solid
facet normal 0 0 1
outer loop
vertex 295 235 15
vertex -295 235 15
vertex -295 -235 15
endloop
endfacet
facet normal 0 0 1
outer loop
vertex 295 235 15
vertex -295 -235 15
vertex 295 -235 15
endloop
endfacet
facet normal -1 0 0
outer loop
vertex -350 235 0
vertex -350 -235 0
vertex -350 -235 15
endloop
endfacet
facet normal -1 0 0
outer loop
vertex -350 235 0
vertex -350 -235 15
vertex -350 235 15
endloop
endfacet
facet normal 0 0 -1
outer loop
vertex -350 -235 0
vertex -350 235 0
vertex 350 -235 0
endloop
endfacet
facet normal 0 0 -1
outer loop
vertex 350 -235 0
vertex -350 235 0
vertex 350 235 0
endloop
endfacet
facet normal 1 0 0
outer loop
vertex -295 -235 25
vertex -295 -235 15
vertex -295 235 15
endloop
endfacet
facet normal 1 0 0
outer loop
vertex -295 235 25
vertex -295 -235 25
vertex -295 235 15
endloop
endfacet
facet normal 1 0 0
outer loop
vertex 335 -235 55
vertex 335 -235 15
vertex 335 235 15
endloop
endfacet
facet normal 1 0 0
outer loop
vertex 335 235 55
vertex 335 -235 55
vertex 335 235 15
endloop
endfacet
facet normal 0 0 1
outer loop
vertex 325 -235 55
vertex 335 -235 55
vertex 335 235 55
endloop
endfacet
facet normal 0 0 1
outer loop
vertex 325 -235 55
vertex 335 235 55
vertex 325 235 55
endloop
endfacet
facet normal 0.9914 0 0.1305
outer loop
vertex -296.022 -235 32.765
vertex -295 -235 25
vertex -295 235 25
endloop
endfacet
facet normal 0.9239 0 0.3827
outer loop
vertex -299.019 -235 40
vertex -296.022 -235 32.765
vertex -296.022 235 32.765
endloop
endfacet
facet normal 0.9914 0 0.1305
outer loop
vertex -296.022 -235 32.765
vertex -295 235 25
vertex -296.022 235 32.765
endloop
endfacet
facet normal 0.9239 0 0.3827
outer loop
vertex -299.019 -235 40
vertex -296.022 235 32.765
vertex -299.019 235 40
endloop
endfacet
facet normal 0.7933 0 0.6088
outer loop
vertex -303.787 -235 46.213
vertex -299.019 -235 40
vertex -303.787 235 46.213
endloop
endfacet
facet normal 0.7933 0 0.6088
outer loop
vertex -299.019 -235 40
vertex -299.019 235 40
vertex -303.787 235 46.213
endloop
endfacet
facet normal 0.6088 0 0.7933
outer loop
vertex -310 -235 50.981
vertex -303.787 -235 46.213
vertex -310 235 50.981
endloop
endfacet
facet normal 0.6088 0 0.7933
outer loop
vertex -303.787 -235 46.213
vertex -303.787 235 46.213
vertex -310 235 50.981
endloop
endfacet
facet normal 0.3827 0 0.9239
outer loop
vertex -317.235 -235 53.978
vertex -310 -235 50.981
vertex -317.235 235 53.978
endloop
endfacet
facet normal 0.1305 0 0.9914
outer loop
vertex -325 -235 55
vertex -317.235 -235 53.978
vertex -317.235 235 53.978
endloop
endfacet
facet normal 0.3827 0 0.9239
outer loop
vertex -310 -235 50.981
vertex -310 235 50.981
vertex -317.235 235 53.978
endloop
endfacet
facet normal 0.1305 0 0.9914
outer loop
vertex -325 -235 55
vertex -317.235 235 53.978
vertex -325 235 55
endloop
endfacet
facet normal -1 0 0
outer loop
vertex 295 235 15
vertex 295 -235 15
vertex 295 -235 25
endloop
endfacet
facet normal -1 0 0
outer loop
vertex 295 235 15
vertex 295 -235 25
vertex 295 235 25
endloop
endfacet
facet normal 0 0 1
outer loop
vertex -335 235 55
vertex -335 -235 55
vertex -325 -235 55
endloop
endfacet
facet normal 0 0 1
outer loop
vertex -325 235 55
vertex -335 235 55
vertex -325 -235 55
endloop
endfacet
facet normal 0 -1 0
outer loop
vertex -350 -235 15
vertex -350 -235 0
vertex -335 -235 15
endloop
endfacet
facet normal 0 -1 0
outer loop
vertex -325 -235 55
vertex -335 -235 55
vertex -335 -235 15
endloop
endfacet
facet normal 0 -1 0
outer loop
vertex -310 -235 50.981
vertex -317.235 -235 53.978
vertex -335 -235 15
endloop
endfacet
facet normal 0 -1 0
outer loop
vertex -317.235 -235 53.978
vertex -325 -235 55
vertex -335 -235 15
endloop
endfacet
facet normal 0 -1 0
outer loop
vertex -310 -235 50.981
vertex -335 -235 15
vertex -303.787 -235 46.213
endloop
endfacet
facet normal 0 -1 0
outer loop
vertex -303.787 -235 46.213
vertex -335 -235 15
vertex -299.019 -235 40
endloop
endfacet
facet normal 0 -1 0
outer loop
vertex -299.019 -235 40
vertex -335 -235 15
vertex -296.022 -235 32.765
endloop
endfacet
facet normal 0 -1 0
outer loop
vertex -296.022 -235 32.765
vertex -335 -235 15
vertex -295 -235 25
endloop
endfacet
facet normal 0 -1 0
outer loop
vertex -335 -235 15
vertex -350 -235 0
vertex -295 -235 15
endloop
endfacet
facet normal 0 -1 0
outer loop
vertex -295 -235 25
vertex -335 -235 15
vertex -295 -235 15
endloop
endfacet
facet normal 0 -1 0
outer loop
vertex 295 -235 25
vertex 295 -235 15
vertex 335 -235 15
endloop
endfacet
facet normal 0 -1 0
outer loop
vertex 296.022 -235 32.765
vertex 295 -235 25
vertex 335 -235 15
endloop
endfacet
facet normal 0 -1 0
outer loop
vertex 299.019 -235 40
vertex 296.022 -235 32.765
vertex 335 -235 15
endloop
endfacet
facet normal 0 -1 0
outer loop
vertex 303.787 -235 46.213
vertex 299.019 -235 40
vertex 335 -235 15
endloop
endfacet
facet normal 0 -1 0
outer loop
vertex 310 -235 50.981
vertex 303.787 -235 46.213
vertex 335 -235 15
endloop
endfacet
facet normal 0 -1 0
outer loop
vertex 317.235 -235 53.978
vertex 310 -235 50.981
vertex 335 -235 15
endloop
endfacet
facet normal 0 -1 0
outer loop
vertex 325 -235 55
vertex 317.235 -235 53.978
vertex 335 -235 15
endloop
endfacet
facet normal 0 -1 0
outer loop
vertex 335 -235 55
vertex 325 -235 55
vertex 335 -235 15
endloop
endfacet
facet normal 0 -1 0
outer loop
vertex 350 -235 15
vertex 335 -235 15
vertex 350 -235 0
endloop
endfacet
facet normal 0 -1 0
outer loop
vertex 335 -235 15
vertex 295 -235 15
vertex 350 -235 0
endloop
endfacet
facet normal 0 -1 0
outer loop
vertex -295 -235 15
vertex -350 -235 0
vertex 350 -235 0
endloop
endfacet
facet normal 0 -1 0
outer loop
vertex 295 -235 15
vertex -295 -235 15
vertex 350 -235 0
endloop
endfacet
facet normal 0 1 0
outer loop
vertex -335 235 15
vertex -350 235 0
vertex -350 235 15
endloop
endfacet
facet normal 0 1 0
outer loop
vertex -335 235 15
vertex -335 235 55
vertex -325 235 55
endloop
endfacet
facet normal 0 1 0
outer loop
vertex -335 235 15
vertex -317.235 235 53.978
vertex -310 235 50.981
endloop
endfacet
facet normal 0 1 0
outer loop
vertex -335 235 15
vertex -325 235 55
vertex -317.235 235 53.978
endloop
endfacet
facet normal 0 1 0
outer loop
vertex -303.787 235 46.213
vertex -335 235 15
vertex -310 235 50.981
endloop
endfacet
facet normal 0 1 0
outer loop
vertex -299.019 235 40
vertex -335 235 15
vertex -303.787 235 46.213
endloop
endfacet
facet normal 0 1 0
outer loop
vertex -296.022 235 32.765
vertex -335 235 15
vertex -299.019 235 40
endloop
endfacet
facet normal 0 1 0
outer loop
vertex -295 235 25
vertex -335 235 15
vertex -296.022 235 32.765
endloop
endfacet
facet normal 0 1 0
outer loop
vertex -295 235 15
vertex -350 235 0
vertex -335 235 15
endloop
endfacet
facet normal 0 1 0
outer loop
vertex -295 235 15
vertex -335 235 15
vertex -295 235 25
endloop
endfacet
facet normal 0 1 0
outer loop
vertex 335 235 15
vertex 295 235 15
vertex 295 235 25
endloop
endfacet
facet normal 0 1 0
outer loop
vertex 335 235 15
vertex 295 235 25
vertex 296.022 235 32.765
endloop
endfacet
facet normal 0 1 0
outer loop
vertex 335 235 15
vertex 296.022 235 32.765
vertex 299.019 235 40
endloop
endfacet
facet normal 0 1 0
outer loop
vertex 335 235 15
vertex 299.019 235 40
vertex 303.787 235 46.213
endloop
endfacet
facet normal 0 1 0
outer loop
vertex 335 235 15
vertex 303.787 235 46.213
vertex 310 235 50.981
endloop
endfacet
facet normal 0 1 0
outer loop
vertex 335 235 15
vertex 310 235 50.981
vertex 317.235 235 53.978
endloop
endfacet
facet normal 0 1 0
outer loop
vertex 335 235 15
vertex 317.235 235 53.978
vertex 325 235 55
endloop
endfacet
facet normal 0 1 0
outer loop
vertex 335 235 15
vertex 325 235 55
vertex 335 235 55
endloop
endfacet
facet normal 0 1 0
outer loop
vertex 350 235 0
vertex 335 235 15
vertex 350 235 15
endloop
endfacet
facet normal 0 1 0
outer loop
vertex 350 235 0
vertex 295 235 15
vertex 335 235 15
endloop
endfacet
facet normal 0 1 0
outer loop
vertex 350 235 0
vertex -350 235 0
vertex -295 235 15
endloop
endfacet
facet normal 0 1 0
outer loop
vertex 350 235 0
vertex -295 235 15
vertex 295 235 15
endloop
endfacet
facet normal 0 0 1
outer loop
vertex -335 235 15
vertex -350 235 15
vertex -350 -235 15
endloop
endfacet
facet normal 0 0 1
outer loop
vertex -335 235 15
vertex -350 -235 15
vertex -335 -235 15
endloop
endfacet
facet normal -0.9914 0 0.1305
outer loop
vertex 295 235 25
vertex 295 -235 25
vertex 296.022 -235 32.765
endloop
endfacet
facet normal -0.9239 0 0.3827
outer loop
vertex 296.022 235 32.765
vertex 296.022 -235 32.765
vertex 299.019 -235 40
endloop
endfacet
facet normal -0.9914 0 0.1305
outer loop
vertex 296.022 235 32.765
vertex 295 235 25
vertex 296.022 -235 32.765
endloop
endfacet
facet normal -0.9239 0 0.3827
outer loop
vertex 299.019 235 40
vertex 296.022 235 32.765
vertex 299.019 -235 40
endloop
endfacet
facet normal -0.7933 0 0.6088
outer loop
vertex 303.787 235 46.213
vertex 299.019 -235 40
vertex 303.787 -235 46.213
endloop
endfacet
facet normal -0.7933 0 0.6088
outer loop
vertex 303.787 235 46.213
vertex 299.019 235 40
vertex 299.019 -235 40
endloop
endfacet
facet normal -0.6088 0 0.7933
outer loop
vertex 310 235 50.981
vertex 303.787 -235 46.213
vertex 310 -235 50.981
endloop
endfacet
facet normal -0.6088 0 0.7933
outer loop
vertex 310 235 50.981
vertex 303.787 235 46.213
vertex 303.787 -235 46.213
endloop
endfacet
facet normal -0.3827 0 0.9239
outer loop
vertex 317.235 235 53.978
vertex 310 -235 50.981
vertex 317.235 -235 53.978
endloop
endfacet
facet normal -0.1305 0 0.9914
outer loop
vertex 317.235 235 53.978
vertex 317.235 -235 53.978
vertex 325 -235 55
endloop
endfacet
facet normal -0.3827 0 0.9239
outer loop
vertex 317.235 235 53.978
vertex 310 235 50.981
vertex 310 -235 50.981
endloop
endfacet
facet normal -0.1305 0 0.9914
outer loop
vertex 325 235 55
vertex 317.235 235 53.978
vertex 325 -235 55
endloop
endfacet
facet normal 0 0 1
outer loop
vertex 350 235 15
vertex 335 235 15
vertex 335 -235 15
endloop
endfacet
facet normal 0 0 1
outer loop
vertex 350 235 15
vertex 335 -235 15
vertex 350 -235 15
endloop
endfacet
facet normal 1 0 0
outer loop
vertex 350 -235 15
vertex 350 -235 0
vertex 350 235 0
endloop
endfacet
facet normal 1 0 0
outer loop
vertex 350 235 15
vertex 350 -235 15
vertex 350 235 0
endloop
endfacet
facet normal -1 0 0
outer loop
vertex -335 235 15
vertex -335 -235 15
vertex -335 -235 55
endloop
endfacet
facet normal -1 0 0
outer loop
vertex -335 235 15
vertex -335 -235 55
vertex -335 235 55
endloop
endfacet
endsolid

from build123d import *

# Parameters (mm, degrees)
SCHIZZO1_W                   = 700
SCHIZZO1_H                   = 470
ESTRUSIONE_ESTRUSIONE1_DEPTH = 15
SCHIZZO2_W                   = 40
SCHIZZO2_H                   = 470
ESTRUSIONE_ESTRUSIONE2_DEPTH = 40
RACCORDO1_R                  = 30
RACCORDO1_OF_SPECCHIA1_R     = 30


with BuildPart() as part:
    # Schizzo1 → Estrusione-Estrusione1 (new body)
    with BuildSketch(Plane.XY):
        Rectangle(SCHIZZO1_W, SCHIZZO1_H)
    extrude(amount=ESTRUSIONE_ESTRUSIONE1_DEPTH)

    # Schizzo2 → Estrusione-Estrusione2 (add)
    with BuildSketch(Plane.XY.offset(15)):
        with Locations((-315, 0)):
            Rectangle(SCHIZZO2_W, SCHIZZO2_H)
    estrusione_estrusione2 = extrude(amount=ESTRUSIONE_ESTRUSIONE2_DEPTH)

    # Raccordo1
    raccordo1_edges = [part.edges().sort_by_distance(p)[0] for p in [
        (-295, 0, 55),
    ]]
    fillet(raccordo1_edges, radius=RACCORDO1_R)

    # Specchia1: Estrusione-Estrusione2 across plane
    add(estrusione_estrusione2.mirror(Plane(origin=(0, 0, 0), x_dir=(0, 0, 1), z_dir=(1, 0, 0))))

    # Raccordo1 of Specchia1
    raccordo1_of_specchia1_edges = [part.edges().sort_by_distance(p)[0] for p in [
        (295, 0, 55),
    ]]
    fillet(raccordo1_of_specchia1_edges, radius=RACCORDO1_OF_SPECCHIA1_R)


solid = part.part
